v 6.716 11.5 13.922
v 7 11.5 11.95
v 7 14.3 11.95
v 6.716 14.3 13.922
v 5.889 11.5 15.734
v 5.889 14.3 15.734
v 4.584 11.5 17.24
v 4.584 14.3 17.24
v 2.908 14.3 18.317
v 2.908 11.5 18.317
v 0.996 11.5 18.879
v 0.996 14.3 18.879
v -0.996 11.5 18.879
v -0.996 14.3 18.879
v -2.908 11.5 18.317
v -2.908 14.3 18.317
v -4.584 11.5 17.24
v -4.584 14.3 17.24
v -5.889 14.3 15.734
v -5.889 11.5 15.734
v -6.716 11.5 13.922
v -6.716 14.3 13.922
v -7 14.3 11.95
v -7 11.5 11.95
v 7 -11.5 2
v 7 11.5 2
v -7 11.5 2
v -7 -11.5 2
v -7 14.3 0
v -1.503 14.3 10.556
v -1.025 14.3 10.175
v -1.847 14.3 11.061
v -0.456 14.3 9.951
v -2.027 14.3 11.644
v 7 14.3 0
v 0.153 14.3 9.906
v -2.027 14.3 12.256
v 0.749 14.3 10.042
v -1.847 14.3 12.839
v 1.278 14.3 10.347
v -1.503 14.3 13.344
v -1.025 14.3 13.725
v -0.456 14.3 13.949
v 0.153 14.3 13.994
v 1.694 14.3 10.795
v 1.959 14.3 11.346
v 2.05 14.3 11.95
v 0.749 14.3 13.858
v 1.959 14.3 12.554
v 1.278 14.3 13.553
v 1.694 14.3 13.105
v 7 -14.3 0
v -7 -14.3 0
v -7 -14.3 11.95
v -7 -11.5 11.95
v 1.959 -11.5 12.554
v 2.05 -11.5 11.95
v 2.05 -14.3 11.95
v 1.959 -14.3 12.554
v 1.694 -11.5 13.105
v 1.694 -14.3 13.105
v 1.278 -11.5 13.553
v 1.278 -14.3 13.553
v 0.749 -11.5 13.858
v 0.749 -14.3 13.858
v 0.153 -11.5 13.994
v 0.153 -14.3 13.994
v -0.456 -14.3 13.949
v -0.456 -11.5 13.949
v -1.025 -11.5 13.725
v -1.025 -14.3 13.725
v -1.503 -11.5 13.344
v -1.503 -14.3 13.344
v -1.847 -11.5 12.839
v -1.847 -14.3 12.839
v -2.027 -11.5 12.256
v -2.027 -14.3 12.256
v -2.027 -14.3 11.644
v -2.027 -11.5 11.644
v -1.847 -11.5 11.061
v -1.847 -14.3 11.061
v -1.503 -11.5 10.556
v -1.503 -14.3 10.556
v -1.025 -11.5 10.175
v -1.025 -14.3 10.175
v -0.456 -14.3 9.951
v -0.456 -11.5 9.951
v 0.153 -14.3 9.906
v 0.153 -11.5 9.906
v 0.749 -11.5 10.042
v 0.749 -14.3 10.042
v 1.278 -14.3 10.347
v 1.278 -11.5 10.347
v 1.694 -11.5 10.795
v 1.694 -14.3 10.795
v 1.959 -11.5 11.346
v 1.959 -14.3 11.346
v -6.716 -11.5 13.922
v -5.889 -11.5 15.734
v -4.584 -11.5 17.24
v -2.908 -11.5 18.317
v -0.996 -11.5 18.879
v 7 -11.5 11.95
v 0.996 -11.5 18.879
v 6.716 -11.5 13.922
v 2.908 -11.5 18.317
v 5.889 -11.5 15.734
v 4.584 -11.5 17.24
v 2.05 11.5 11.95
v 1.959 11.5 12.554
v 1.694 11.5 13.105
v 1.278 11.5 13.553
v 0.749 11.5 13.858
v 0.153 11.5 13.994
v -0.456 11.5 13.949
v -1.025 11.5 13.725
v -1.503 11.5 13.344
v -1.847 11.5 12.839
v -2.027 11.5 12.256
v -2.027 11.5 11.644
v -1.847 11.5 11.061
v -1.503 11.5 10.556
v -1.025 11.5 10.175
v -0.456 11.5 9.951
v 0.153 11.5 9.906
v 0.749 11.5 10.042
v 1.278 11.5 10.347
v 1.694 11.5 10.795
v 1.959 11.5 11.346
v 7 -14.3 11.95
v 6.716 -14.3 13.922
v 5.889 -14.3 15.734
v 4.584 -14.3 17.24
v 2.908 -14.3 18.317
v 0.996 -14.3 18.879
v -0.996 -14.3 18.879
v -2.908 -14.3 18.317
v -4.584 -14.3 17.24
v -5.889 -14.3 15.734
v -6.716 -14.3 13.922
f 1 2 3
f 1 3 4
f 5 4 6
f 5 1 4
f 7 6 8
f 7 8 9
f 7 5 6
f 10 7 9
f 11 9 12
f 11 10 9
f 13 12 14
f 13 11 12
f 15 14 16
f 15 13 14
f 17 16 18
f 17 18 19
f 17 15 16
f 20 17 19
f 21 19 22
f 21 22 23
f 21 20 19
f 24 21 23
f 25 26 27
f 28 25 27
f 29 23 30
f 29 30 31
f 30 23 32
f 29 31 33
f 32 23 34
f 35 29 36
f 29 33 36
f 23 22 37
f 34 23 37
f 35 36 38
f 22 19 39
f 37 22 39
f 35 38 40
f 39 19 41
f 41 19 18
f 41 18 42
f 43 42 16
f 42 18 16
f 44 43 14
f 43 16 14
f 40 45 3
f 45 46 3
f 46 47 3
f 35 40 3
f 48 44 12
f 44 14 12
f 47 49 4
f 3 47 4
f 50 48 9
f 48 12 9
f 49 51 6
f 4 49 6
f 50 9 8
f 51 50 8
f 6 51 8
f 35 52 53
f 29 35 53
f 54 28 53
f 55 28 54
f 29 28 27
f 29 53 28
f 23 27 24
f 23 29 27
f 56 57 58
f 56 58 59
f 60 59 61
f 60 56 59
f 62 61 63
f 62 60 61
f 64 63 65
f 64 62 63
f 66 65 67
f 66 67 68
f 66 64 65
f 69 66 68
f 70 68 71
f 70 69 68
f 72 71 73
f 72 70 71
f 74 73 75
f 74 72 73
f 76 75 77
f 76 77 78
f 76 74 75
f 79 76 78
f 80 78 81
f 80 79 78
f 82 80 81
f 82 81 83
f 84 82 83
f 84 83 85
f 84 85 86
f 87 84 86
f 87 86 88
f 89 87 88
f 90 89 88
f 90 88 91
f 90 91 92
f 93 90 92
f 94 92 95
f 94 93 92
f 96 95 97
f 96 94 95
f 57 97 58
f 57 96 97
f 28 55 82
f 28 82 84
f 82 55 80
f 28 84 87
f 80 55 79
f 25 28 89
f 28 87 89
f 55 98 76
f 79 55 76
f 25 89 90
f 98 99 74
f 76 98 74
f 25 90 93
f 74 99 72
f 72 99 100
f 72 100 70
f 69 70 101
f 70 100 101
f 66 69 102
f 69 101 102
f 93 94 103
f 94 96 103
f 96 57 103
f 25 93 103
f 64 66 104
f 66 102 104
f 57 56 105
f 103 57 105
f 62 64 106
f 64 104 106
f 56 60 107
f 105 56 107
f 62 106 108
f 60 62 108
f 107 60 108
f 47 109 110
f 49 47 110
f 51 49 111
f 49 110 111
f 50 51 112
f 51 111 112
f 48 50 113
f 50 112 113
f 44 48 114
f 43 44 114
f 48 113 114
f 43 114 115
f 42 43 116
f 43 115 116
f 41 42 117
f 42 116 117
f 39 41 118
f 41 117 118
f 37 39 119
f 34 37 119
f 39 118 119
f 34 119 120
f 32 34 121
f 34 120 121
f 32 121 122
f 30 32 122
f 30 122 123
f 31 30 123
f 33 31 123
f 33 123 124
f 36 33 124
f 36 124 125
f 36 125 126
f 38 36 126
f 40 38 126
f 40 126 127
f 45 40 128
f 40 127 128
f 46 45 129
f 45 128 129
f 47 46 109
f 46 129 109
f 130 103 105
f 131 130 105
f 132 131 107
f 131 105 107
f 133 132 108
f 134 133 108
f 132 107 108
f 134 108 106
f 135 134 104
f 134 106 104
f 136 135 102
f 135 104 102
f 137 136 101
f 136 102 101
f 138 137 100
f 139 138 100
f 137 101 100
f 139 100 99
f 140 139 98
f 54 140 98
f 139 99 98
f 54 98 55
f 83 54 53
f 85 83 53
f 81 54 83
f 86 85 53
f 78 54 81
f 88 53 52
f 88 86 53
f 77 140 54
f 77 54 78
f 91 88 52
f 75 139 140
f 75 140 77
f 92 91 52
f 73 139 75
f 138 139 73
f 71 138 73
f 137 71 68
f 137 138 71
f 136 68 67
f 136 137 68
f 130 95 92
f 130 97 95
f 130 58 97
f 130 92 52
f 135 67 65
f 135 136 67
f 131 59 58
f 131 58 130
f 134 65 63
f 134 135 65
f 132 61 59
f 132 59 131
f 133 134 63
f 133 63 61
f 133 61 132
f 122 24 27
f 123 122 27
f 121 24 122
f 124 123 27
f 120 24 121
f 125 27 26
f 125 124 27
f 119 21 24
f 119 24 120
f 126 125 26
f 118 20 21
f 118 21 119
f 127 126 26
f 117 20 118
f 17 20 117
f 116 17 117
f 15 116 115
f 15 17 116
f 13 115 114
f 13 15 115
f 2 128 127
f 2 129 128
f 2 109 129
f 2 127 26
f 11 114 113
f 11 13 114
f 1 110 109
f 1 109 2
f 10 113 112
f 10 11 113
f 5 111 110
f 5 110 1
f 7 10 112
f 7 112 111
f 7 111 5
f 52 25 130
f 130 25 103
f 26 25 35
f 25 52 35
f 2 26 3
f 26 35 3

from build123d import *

# Parameters (mm, degrees)
F1_R     = 2.05
F2_DEPTH = 2.8
F3_W     = 14
F3_H     = 2
F4_DEPTH = 11.5


with BuildPart() as f2:
    # F1 (on offset) → F2 (new body)
    with BuildSketch(Plane.XZ.offset(11.5)):
        with BuildLine():
            Line((-7, 11.95), (-7, 0))
            Line((-7, 0), (7, 0))
            Line((7, 0), (7, 11.95))
            ThreePointArc((7, 11.95), (0, 18.95), (-7, 11.95))
        make_face()
        with Locations((0, 11.95)):
            Circle(F1_R, mode=Mode.SUBTRACT)
    extrude(amount=F2_DEPTH)

    # F3 (on face) → F4 (join, through all)
    with BuildSketch(Plane(origin=(0, -11.5, 0), x_dir=(-1, 0, 0), z_dir=(0, 1, 0))):
        with Locations((0, 1)):
            Rectangle(F3_W, F3_H)
    extrude(amount=F4_DEPTH)

    # F5: F2 across plane


with BuildPart() as f2_1:
    add(f2.part)
    add(f2.part.mirror(Plane.XZ))


solid = f2_1.part
